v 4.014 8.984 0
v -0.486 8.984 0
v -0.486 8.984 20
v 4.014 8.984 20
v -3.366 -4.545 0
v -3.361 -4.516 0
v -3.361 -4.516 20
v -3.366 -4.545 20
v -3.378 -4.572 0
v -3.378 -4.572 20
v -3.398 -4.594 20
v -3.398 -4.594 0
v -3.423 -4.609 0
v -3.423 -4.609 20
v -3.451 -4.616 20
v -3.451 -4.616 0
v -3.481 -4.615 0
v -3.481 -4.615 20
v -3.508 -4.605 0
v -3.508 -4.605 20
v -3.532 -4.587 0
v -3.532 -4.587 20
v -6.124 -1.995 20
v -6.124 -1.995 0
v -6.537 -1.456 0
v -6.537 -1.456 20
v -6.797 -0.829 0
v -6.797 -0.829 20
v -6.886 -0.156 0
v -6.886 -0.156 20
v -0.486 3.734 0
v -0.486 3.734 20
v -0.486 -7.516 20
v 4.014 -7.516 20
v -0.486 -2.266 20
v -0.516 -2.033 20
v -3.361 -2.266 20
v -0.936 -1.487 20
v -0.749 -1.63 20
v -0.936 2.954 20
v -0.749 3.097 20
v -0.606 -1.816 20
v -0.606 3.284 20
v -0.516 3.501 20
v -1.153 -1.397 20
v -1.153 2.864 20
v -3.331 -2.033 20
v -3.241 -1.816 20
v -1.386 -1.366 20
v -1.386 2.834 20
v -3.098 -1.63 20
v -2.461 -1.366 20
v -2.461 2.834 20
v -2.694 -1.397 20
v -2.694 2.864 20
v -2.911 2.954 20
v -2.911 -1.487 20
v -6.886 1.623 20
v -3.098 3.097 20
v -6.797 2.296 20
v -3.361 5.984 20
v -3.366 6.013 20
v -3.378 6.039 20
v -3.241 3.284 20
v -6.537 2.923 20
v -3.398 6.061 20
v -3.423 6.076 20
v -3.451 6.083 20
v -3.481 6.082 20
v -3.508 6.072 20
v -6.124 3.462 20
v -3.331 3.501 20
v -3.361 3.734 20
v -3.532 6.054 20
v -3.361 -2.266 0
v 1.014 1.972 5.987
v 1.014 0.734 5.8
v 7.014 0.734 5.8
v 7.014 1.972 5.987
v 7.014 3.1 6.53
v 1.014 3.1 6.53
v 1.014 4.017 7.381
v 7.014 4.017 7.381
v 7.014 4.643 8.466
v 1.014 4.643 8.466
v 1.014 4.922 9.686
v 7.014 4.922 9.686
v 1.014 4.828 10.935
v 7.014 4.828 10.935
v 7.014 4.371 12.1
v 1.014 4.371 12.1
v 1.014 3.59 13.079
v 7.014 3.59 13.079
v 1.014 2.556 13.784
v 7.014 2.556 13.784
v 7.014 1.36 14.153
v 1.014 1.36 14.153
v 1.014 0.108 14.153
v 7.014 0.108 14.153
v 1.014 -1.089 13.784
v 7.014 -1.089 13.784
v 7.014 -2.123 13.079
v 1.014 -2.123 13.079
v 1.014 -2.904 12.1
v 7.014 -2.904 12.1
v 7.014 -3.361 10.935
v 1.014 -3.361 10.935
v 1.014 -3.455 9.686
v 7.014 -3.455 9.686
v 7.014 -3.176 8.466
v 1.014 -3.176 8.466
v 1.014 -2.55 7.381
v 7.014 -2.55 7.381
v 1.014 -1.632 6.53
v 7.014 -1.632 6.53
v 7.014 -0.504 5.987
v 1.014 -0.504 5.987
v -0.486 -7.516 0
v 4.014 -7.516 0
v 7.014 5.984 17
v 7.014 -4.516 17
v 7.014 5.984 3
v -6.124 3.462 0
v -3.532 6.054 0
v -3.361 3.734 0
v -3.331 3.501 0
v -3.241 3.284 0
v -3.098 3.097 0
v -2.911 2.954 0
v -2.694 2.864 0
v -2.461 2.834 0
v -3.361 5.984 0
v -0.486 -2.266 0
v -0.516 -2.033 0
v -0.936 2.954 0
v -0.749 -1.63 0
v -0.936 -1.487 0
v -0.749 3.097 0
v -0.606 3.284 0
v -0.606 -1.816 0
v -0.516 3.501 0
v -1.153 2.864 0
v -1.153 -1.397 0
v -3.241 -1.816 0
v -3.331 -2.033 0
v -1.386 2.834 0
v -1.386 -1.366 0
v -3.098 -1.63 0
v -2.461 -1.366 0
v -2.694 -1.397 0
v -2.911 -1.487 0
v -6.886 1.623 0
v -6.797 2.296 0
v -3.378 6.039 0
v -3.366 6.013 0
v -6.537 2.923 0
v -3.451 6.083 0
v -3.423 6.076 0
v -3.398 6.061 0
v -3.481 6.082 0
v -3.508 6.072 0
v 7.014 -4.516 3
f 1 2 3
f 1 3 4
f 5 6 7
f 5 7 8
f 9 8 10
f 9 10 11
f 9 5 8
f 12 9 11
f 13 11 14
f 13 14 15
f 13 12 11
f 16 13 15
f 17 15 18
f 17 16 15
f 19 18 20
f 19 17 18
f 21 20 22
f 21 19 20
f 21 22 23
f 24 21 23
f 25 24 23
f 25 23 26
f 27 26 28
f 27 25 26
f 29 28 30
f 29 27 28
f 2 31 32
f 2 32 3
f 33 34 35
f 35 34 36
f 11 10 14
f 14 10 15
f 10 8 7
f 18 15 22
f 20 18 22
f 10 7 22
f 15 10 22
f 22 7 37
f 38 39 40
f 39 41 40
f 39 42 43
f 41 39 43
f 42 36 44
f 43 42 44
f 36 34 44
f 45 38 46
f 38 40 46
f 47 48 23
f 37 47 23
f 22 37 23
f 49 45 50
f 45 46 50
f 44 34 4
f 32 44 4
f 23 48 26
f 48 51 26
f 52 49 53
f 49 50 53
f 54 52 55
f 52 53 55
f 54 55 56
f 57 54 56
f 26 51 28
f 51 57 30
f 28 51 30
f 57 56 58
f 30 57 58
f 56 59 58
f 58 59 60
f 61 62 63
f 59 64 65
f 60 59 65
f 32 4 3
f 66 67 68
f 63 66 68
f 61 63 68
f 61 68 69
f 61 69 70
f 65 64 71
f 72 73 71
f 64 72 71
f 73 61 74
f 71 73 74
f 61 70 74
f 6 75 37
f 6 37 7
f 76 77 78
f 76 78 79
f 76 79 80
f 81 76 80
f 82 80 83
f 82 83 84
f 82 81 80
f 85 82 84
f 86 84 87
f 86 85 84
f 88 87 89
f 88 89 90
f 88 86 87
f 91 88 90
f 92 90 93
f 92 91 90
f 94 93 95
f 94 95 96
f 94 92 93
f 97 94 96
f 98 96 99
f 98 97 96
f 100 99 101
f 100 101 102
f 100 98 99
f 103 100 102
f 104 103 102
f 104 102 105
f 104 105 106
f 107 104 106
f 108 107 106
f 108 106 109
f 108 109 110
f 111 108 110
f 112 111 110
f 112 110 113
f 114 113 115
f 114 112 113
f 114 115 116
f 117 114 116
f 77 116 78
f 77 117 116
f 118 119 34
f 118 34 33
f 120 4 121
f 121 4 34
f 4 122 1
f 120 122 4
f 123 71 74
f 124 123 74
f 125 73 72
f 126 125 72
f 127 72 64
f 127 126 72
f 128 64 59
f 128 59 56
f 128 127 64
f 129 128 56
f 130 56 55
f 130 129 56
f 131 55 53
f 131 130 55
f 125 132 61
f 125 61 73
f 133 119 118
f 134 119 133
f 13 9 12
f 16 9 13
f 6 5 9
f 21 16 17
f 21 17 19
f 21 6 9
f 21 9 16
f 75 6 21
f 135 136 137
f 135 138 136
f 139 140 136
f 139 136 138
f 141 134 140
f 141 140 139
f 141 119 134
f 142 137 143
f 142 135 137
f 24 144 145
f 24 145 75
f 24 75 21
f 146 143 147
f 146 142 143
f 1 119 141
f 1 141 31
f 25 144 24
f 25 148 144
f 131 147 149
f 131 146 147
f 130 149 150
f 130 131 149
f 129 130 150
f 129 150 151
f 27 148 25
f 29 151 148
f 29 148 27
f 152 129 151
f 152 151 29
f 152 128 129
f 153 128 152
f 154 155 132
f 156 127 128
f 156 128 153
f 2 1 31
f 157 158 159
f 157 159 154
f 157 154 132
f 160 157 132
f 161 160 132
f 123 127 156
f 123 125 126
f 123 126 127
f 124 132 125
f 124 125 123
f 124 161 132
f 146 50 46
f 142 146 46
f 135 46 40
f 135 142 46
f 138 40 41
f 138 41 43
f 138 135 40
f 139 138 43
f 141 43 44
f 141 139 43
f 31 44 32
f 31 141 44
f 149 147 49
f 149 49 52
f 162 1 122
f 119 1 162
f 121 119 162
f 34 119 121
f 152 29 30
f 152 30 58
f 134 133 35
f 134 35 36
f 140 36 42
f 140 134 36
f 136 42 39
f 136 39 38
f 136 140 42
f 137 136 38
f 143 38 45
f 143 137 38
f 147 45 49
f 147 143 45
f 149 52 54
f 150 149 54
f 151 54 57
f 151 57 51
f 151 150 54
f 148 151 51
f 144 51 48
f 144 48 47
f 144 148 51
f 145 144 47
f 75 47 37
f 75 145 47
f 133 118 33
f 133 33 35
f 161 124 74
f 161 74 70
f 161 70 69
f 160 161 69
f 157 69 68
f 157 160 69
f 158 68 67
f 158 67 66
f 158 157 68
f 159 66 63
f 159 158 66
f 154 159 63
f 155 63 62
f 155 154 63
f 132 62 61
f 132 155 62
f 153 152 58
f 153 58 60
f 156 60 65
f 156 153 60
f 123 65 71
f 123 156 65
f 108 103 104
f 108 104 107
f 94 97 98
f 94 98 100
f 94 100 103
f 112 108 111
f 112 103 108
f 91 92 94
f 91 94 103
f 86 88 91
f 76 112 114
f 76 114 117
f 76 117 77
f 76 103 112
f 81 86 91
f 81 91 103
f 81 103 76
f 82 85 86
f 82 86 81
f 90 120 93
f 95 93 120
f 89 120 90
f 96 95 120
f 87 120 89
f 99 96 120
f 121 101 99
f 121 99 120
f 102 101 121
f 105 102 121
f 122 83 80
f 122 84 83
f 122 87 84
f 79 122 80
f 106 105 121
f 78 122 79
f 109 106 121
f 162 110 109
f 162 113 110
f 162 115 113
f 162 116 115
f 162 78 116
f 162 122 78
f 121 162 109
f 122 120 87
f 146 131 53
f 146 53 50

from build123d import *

# Parameters (mm, degrees)
BOSS_EXTRUDE1_DEPTH = 20
CHAMFER1_SIZE       = 3
CUT_EXTRUDE1_START  = 1.014174
SKETCH2_R           = 4.2
CUT_EXTRUDE1_DEPTH  = 6


with BuildPart() as part:
    # Sketch1 → Boss-Extrude1 (new body)
    with BuildSketch(Plane.XY):
        with BuildLine():
            Line((-1.385825984, -1.366427285), (-2.461204781, -1.366427285))
            ThreePointArc((-2.461204781, -1.366427285), (-3.097600884, -1.630031182), (-3.361204781, -2.266427285))
            Line((-3.361204781, -2.266427285), (-3.361204781, -4.516427285))
            ThreePointArc((-3.361204781, -4.516427285), (-3.422936438, -4.608815239), (-3.531915459, -4.587137963))
            Line((-3.531915459, -4.587137963), (-6.124303615, -1.994749808))
            ThreePointArc((-6.124303615, -1.994749808), (-6.687912768, -1.151249101), (-6.885825984, -0.156272177))
            Line((-6.885825984, -0.156272177), (-6.885825984, 1.623417606))
            ThreePointArc((-6.885825984, 1.623417606), (-6.687912768, 2.61839453), (-6.124303615, 3.461895237))
            Line((-6.124303615, 3.461895237), (-3.531915459, 6.054283393))
            ThreePointArc((-3.531915459, 6.054283393), (-3.422936438, 6.075960668), (-3.361204781, 5.983572715))
            Line((-3.361204781, 5.983572715), (-3.361204781, 3.733572715))
            ThreePointArc((-3.361204781, 3.733572715), (-3.097600884, 3.097176612), (-2.461204781, 2.833572715))
            Line((-2.461204781, 2.833572715), (-1.385825984, 2.833572715))
            ThreePointArc((-1.385825984, 2.833572715), (-0.749429881, 3.097176612), (-0.485825984, 3.733572715))
            Line((-0.485825984, 3.733572715), (-0.485825984, 8.983572715))
            Line((-0.485825984, 8.983572715), (7.014174016, 8.983572715))
            Line((7.014174016, 8.983572715), (7.014174016, -7.516427285))
            Line((7.014174016, -7.516427285), (-0.485825984, -7.516427285))
            Line((-0.485825984, -7.516427285), (-0.485825984, -2.266427285))
            ThreePointArc((-0.485825984, -2.266427285), (-0.749429881, -1.630031182), (-1.385825984, -1.366427285))
        make_face()
    extrude(amount=BOSS_EXTRUDE1_DEPTH)

    # Chamfer1
    chamfer1_edges = [part.edges().sort_by_distance(p)[0] for p in [
        (7.014174016, 0.733572715, 20),
        (7.014174016, 0.733572715, 0),
        (7.014174016, 8.983572715, 10),
        (7.014174016, -7.516427285, 10),
    ]]
    chamfer(chamfer1_edges, length=CHAMFER1_SIZE)

    # Sketch2 (on Right Plane) → Cut-Extrude1 (cut)
    with BuildSketch(Plane(origin=(0, 0, 0), x_dir=(0, 0, -1), z_dir=(1, 0, 0)).offset(CUT_EXTRUDE1_START)):
        with Locations((-10, 0.733572715)):
            Circle(SKETCH2_R)
    extrude(amount=CUT_EXTRUDE1_DEPTH, mode=Mode.SUBTRACT)


solid = part.part
